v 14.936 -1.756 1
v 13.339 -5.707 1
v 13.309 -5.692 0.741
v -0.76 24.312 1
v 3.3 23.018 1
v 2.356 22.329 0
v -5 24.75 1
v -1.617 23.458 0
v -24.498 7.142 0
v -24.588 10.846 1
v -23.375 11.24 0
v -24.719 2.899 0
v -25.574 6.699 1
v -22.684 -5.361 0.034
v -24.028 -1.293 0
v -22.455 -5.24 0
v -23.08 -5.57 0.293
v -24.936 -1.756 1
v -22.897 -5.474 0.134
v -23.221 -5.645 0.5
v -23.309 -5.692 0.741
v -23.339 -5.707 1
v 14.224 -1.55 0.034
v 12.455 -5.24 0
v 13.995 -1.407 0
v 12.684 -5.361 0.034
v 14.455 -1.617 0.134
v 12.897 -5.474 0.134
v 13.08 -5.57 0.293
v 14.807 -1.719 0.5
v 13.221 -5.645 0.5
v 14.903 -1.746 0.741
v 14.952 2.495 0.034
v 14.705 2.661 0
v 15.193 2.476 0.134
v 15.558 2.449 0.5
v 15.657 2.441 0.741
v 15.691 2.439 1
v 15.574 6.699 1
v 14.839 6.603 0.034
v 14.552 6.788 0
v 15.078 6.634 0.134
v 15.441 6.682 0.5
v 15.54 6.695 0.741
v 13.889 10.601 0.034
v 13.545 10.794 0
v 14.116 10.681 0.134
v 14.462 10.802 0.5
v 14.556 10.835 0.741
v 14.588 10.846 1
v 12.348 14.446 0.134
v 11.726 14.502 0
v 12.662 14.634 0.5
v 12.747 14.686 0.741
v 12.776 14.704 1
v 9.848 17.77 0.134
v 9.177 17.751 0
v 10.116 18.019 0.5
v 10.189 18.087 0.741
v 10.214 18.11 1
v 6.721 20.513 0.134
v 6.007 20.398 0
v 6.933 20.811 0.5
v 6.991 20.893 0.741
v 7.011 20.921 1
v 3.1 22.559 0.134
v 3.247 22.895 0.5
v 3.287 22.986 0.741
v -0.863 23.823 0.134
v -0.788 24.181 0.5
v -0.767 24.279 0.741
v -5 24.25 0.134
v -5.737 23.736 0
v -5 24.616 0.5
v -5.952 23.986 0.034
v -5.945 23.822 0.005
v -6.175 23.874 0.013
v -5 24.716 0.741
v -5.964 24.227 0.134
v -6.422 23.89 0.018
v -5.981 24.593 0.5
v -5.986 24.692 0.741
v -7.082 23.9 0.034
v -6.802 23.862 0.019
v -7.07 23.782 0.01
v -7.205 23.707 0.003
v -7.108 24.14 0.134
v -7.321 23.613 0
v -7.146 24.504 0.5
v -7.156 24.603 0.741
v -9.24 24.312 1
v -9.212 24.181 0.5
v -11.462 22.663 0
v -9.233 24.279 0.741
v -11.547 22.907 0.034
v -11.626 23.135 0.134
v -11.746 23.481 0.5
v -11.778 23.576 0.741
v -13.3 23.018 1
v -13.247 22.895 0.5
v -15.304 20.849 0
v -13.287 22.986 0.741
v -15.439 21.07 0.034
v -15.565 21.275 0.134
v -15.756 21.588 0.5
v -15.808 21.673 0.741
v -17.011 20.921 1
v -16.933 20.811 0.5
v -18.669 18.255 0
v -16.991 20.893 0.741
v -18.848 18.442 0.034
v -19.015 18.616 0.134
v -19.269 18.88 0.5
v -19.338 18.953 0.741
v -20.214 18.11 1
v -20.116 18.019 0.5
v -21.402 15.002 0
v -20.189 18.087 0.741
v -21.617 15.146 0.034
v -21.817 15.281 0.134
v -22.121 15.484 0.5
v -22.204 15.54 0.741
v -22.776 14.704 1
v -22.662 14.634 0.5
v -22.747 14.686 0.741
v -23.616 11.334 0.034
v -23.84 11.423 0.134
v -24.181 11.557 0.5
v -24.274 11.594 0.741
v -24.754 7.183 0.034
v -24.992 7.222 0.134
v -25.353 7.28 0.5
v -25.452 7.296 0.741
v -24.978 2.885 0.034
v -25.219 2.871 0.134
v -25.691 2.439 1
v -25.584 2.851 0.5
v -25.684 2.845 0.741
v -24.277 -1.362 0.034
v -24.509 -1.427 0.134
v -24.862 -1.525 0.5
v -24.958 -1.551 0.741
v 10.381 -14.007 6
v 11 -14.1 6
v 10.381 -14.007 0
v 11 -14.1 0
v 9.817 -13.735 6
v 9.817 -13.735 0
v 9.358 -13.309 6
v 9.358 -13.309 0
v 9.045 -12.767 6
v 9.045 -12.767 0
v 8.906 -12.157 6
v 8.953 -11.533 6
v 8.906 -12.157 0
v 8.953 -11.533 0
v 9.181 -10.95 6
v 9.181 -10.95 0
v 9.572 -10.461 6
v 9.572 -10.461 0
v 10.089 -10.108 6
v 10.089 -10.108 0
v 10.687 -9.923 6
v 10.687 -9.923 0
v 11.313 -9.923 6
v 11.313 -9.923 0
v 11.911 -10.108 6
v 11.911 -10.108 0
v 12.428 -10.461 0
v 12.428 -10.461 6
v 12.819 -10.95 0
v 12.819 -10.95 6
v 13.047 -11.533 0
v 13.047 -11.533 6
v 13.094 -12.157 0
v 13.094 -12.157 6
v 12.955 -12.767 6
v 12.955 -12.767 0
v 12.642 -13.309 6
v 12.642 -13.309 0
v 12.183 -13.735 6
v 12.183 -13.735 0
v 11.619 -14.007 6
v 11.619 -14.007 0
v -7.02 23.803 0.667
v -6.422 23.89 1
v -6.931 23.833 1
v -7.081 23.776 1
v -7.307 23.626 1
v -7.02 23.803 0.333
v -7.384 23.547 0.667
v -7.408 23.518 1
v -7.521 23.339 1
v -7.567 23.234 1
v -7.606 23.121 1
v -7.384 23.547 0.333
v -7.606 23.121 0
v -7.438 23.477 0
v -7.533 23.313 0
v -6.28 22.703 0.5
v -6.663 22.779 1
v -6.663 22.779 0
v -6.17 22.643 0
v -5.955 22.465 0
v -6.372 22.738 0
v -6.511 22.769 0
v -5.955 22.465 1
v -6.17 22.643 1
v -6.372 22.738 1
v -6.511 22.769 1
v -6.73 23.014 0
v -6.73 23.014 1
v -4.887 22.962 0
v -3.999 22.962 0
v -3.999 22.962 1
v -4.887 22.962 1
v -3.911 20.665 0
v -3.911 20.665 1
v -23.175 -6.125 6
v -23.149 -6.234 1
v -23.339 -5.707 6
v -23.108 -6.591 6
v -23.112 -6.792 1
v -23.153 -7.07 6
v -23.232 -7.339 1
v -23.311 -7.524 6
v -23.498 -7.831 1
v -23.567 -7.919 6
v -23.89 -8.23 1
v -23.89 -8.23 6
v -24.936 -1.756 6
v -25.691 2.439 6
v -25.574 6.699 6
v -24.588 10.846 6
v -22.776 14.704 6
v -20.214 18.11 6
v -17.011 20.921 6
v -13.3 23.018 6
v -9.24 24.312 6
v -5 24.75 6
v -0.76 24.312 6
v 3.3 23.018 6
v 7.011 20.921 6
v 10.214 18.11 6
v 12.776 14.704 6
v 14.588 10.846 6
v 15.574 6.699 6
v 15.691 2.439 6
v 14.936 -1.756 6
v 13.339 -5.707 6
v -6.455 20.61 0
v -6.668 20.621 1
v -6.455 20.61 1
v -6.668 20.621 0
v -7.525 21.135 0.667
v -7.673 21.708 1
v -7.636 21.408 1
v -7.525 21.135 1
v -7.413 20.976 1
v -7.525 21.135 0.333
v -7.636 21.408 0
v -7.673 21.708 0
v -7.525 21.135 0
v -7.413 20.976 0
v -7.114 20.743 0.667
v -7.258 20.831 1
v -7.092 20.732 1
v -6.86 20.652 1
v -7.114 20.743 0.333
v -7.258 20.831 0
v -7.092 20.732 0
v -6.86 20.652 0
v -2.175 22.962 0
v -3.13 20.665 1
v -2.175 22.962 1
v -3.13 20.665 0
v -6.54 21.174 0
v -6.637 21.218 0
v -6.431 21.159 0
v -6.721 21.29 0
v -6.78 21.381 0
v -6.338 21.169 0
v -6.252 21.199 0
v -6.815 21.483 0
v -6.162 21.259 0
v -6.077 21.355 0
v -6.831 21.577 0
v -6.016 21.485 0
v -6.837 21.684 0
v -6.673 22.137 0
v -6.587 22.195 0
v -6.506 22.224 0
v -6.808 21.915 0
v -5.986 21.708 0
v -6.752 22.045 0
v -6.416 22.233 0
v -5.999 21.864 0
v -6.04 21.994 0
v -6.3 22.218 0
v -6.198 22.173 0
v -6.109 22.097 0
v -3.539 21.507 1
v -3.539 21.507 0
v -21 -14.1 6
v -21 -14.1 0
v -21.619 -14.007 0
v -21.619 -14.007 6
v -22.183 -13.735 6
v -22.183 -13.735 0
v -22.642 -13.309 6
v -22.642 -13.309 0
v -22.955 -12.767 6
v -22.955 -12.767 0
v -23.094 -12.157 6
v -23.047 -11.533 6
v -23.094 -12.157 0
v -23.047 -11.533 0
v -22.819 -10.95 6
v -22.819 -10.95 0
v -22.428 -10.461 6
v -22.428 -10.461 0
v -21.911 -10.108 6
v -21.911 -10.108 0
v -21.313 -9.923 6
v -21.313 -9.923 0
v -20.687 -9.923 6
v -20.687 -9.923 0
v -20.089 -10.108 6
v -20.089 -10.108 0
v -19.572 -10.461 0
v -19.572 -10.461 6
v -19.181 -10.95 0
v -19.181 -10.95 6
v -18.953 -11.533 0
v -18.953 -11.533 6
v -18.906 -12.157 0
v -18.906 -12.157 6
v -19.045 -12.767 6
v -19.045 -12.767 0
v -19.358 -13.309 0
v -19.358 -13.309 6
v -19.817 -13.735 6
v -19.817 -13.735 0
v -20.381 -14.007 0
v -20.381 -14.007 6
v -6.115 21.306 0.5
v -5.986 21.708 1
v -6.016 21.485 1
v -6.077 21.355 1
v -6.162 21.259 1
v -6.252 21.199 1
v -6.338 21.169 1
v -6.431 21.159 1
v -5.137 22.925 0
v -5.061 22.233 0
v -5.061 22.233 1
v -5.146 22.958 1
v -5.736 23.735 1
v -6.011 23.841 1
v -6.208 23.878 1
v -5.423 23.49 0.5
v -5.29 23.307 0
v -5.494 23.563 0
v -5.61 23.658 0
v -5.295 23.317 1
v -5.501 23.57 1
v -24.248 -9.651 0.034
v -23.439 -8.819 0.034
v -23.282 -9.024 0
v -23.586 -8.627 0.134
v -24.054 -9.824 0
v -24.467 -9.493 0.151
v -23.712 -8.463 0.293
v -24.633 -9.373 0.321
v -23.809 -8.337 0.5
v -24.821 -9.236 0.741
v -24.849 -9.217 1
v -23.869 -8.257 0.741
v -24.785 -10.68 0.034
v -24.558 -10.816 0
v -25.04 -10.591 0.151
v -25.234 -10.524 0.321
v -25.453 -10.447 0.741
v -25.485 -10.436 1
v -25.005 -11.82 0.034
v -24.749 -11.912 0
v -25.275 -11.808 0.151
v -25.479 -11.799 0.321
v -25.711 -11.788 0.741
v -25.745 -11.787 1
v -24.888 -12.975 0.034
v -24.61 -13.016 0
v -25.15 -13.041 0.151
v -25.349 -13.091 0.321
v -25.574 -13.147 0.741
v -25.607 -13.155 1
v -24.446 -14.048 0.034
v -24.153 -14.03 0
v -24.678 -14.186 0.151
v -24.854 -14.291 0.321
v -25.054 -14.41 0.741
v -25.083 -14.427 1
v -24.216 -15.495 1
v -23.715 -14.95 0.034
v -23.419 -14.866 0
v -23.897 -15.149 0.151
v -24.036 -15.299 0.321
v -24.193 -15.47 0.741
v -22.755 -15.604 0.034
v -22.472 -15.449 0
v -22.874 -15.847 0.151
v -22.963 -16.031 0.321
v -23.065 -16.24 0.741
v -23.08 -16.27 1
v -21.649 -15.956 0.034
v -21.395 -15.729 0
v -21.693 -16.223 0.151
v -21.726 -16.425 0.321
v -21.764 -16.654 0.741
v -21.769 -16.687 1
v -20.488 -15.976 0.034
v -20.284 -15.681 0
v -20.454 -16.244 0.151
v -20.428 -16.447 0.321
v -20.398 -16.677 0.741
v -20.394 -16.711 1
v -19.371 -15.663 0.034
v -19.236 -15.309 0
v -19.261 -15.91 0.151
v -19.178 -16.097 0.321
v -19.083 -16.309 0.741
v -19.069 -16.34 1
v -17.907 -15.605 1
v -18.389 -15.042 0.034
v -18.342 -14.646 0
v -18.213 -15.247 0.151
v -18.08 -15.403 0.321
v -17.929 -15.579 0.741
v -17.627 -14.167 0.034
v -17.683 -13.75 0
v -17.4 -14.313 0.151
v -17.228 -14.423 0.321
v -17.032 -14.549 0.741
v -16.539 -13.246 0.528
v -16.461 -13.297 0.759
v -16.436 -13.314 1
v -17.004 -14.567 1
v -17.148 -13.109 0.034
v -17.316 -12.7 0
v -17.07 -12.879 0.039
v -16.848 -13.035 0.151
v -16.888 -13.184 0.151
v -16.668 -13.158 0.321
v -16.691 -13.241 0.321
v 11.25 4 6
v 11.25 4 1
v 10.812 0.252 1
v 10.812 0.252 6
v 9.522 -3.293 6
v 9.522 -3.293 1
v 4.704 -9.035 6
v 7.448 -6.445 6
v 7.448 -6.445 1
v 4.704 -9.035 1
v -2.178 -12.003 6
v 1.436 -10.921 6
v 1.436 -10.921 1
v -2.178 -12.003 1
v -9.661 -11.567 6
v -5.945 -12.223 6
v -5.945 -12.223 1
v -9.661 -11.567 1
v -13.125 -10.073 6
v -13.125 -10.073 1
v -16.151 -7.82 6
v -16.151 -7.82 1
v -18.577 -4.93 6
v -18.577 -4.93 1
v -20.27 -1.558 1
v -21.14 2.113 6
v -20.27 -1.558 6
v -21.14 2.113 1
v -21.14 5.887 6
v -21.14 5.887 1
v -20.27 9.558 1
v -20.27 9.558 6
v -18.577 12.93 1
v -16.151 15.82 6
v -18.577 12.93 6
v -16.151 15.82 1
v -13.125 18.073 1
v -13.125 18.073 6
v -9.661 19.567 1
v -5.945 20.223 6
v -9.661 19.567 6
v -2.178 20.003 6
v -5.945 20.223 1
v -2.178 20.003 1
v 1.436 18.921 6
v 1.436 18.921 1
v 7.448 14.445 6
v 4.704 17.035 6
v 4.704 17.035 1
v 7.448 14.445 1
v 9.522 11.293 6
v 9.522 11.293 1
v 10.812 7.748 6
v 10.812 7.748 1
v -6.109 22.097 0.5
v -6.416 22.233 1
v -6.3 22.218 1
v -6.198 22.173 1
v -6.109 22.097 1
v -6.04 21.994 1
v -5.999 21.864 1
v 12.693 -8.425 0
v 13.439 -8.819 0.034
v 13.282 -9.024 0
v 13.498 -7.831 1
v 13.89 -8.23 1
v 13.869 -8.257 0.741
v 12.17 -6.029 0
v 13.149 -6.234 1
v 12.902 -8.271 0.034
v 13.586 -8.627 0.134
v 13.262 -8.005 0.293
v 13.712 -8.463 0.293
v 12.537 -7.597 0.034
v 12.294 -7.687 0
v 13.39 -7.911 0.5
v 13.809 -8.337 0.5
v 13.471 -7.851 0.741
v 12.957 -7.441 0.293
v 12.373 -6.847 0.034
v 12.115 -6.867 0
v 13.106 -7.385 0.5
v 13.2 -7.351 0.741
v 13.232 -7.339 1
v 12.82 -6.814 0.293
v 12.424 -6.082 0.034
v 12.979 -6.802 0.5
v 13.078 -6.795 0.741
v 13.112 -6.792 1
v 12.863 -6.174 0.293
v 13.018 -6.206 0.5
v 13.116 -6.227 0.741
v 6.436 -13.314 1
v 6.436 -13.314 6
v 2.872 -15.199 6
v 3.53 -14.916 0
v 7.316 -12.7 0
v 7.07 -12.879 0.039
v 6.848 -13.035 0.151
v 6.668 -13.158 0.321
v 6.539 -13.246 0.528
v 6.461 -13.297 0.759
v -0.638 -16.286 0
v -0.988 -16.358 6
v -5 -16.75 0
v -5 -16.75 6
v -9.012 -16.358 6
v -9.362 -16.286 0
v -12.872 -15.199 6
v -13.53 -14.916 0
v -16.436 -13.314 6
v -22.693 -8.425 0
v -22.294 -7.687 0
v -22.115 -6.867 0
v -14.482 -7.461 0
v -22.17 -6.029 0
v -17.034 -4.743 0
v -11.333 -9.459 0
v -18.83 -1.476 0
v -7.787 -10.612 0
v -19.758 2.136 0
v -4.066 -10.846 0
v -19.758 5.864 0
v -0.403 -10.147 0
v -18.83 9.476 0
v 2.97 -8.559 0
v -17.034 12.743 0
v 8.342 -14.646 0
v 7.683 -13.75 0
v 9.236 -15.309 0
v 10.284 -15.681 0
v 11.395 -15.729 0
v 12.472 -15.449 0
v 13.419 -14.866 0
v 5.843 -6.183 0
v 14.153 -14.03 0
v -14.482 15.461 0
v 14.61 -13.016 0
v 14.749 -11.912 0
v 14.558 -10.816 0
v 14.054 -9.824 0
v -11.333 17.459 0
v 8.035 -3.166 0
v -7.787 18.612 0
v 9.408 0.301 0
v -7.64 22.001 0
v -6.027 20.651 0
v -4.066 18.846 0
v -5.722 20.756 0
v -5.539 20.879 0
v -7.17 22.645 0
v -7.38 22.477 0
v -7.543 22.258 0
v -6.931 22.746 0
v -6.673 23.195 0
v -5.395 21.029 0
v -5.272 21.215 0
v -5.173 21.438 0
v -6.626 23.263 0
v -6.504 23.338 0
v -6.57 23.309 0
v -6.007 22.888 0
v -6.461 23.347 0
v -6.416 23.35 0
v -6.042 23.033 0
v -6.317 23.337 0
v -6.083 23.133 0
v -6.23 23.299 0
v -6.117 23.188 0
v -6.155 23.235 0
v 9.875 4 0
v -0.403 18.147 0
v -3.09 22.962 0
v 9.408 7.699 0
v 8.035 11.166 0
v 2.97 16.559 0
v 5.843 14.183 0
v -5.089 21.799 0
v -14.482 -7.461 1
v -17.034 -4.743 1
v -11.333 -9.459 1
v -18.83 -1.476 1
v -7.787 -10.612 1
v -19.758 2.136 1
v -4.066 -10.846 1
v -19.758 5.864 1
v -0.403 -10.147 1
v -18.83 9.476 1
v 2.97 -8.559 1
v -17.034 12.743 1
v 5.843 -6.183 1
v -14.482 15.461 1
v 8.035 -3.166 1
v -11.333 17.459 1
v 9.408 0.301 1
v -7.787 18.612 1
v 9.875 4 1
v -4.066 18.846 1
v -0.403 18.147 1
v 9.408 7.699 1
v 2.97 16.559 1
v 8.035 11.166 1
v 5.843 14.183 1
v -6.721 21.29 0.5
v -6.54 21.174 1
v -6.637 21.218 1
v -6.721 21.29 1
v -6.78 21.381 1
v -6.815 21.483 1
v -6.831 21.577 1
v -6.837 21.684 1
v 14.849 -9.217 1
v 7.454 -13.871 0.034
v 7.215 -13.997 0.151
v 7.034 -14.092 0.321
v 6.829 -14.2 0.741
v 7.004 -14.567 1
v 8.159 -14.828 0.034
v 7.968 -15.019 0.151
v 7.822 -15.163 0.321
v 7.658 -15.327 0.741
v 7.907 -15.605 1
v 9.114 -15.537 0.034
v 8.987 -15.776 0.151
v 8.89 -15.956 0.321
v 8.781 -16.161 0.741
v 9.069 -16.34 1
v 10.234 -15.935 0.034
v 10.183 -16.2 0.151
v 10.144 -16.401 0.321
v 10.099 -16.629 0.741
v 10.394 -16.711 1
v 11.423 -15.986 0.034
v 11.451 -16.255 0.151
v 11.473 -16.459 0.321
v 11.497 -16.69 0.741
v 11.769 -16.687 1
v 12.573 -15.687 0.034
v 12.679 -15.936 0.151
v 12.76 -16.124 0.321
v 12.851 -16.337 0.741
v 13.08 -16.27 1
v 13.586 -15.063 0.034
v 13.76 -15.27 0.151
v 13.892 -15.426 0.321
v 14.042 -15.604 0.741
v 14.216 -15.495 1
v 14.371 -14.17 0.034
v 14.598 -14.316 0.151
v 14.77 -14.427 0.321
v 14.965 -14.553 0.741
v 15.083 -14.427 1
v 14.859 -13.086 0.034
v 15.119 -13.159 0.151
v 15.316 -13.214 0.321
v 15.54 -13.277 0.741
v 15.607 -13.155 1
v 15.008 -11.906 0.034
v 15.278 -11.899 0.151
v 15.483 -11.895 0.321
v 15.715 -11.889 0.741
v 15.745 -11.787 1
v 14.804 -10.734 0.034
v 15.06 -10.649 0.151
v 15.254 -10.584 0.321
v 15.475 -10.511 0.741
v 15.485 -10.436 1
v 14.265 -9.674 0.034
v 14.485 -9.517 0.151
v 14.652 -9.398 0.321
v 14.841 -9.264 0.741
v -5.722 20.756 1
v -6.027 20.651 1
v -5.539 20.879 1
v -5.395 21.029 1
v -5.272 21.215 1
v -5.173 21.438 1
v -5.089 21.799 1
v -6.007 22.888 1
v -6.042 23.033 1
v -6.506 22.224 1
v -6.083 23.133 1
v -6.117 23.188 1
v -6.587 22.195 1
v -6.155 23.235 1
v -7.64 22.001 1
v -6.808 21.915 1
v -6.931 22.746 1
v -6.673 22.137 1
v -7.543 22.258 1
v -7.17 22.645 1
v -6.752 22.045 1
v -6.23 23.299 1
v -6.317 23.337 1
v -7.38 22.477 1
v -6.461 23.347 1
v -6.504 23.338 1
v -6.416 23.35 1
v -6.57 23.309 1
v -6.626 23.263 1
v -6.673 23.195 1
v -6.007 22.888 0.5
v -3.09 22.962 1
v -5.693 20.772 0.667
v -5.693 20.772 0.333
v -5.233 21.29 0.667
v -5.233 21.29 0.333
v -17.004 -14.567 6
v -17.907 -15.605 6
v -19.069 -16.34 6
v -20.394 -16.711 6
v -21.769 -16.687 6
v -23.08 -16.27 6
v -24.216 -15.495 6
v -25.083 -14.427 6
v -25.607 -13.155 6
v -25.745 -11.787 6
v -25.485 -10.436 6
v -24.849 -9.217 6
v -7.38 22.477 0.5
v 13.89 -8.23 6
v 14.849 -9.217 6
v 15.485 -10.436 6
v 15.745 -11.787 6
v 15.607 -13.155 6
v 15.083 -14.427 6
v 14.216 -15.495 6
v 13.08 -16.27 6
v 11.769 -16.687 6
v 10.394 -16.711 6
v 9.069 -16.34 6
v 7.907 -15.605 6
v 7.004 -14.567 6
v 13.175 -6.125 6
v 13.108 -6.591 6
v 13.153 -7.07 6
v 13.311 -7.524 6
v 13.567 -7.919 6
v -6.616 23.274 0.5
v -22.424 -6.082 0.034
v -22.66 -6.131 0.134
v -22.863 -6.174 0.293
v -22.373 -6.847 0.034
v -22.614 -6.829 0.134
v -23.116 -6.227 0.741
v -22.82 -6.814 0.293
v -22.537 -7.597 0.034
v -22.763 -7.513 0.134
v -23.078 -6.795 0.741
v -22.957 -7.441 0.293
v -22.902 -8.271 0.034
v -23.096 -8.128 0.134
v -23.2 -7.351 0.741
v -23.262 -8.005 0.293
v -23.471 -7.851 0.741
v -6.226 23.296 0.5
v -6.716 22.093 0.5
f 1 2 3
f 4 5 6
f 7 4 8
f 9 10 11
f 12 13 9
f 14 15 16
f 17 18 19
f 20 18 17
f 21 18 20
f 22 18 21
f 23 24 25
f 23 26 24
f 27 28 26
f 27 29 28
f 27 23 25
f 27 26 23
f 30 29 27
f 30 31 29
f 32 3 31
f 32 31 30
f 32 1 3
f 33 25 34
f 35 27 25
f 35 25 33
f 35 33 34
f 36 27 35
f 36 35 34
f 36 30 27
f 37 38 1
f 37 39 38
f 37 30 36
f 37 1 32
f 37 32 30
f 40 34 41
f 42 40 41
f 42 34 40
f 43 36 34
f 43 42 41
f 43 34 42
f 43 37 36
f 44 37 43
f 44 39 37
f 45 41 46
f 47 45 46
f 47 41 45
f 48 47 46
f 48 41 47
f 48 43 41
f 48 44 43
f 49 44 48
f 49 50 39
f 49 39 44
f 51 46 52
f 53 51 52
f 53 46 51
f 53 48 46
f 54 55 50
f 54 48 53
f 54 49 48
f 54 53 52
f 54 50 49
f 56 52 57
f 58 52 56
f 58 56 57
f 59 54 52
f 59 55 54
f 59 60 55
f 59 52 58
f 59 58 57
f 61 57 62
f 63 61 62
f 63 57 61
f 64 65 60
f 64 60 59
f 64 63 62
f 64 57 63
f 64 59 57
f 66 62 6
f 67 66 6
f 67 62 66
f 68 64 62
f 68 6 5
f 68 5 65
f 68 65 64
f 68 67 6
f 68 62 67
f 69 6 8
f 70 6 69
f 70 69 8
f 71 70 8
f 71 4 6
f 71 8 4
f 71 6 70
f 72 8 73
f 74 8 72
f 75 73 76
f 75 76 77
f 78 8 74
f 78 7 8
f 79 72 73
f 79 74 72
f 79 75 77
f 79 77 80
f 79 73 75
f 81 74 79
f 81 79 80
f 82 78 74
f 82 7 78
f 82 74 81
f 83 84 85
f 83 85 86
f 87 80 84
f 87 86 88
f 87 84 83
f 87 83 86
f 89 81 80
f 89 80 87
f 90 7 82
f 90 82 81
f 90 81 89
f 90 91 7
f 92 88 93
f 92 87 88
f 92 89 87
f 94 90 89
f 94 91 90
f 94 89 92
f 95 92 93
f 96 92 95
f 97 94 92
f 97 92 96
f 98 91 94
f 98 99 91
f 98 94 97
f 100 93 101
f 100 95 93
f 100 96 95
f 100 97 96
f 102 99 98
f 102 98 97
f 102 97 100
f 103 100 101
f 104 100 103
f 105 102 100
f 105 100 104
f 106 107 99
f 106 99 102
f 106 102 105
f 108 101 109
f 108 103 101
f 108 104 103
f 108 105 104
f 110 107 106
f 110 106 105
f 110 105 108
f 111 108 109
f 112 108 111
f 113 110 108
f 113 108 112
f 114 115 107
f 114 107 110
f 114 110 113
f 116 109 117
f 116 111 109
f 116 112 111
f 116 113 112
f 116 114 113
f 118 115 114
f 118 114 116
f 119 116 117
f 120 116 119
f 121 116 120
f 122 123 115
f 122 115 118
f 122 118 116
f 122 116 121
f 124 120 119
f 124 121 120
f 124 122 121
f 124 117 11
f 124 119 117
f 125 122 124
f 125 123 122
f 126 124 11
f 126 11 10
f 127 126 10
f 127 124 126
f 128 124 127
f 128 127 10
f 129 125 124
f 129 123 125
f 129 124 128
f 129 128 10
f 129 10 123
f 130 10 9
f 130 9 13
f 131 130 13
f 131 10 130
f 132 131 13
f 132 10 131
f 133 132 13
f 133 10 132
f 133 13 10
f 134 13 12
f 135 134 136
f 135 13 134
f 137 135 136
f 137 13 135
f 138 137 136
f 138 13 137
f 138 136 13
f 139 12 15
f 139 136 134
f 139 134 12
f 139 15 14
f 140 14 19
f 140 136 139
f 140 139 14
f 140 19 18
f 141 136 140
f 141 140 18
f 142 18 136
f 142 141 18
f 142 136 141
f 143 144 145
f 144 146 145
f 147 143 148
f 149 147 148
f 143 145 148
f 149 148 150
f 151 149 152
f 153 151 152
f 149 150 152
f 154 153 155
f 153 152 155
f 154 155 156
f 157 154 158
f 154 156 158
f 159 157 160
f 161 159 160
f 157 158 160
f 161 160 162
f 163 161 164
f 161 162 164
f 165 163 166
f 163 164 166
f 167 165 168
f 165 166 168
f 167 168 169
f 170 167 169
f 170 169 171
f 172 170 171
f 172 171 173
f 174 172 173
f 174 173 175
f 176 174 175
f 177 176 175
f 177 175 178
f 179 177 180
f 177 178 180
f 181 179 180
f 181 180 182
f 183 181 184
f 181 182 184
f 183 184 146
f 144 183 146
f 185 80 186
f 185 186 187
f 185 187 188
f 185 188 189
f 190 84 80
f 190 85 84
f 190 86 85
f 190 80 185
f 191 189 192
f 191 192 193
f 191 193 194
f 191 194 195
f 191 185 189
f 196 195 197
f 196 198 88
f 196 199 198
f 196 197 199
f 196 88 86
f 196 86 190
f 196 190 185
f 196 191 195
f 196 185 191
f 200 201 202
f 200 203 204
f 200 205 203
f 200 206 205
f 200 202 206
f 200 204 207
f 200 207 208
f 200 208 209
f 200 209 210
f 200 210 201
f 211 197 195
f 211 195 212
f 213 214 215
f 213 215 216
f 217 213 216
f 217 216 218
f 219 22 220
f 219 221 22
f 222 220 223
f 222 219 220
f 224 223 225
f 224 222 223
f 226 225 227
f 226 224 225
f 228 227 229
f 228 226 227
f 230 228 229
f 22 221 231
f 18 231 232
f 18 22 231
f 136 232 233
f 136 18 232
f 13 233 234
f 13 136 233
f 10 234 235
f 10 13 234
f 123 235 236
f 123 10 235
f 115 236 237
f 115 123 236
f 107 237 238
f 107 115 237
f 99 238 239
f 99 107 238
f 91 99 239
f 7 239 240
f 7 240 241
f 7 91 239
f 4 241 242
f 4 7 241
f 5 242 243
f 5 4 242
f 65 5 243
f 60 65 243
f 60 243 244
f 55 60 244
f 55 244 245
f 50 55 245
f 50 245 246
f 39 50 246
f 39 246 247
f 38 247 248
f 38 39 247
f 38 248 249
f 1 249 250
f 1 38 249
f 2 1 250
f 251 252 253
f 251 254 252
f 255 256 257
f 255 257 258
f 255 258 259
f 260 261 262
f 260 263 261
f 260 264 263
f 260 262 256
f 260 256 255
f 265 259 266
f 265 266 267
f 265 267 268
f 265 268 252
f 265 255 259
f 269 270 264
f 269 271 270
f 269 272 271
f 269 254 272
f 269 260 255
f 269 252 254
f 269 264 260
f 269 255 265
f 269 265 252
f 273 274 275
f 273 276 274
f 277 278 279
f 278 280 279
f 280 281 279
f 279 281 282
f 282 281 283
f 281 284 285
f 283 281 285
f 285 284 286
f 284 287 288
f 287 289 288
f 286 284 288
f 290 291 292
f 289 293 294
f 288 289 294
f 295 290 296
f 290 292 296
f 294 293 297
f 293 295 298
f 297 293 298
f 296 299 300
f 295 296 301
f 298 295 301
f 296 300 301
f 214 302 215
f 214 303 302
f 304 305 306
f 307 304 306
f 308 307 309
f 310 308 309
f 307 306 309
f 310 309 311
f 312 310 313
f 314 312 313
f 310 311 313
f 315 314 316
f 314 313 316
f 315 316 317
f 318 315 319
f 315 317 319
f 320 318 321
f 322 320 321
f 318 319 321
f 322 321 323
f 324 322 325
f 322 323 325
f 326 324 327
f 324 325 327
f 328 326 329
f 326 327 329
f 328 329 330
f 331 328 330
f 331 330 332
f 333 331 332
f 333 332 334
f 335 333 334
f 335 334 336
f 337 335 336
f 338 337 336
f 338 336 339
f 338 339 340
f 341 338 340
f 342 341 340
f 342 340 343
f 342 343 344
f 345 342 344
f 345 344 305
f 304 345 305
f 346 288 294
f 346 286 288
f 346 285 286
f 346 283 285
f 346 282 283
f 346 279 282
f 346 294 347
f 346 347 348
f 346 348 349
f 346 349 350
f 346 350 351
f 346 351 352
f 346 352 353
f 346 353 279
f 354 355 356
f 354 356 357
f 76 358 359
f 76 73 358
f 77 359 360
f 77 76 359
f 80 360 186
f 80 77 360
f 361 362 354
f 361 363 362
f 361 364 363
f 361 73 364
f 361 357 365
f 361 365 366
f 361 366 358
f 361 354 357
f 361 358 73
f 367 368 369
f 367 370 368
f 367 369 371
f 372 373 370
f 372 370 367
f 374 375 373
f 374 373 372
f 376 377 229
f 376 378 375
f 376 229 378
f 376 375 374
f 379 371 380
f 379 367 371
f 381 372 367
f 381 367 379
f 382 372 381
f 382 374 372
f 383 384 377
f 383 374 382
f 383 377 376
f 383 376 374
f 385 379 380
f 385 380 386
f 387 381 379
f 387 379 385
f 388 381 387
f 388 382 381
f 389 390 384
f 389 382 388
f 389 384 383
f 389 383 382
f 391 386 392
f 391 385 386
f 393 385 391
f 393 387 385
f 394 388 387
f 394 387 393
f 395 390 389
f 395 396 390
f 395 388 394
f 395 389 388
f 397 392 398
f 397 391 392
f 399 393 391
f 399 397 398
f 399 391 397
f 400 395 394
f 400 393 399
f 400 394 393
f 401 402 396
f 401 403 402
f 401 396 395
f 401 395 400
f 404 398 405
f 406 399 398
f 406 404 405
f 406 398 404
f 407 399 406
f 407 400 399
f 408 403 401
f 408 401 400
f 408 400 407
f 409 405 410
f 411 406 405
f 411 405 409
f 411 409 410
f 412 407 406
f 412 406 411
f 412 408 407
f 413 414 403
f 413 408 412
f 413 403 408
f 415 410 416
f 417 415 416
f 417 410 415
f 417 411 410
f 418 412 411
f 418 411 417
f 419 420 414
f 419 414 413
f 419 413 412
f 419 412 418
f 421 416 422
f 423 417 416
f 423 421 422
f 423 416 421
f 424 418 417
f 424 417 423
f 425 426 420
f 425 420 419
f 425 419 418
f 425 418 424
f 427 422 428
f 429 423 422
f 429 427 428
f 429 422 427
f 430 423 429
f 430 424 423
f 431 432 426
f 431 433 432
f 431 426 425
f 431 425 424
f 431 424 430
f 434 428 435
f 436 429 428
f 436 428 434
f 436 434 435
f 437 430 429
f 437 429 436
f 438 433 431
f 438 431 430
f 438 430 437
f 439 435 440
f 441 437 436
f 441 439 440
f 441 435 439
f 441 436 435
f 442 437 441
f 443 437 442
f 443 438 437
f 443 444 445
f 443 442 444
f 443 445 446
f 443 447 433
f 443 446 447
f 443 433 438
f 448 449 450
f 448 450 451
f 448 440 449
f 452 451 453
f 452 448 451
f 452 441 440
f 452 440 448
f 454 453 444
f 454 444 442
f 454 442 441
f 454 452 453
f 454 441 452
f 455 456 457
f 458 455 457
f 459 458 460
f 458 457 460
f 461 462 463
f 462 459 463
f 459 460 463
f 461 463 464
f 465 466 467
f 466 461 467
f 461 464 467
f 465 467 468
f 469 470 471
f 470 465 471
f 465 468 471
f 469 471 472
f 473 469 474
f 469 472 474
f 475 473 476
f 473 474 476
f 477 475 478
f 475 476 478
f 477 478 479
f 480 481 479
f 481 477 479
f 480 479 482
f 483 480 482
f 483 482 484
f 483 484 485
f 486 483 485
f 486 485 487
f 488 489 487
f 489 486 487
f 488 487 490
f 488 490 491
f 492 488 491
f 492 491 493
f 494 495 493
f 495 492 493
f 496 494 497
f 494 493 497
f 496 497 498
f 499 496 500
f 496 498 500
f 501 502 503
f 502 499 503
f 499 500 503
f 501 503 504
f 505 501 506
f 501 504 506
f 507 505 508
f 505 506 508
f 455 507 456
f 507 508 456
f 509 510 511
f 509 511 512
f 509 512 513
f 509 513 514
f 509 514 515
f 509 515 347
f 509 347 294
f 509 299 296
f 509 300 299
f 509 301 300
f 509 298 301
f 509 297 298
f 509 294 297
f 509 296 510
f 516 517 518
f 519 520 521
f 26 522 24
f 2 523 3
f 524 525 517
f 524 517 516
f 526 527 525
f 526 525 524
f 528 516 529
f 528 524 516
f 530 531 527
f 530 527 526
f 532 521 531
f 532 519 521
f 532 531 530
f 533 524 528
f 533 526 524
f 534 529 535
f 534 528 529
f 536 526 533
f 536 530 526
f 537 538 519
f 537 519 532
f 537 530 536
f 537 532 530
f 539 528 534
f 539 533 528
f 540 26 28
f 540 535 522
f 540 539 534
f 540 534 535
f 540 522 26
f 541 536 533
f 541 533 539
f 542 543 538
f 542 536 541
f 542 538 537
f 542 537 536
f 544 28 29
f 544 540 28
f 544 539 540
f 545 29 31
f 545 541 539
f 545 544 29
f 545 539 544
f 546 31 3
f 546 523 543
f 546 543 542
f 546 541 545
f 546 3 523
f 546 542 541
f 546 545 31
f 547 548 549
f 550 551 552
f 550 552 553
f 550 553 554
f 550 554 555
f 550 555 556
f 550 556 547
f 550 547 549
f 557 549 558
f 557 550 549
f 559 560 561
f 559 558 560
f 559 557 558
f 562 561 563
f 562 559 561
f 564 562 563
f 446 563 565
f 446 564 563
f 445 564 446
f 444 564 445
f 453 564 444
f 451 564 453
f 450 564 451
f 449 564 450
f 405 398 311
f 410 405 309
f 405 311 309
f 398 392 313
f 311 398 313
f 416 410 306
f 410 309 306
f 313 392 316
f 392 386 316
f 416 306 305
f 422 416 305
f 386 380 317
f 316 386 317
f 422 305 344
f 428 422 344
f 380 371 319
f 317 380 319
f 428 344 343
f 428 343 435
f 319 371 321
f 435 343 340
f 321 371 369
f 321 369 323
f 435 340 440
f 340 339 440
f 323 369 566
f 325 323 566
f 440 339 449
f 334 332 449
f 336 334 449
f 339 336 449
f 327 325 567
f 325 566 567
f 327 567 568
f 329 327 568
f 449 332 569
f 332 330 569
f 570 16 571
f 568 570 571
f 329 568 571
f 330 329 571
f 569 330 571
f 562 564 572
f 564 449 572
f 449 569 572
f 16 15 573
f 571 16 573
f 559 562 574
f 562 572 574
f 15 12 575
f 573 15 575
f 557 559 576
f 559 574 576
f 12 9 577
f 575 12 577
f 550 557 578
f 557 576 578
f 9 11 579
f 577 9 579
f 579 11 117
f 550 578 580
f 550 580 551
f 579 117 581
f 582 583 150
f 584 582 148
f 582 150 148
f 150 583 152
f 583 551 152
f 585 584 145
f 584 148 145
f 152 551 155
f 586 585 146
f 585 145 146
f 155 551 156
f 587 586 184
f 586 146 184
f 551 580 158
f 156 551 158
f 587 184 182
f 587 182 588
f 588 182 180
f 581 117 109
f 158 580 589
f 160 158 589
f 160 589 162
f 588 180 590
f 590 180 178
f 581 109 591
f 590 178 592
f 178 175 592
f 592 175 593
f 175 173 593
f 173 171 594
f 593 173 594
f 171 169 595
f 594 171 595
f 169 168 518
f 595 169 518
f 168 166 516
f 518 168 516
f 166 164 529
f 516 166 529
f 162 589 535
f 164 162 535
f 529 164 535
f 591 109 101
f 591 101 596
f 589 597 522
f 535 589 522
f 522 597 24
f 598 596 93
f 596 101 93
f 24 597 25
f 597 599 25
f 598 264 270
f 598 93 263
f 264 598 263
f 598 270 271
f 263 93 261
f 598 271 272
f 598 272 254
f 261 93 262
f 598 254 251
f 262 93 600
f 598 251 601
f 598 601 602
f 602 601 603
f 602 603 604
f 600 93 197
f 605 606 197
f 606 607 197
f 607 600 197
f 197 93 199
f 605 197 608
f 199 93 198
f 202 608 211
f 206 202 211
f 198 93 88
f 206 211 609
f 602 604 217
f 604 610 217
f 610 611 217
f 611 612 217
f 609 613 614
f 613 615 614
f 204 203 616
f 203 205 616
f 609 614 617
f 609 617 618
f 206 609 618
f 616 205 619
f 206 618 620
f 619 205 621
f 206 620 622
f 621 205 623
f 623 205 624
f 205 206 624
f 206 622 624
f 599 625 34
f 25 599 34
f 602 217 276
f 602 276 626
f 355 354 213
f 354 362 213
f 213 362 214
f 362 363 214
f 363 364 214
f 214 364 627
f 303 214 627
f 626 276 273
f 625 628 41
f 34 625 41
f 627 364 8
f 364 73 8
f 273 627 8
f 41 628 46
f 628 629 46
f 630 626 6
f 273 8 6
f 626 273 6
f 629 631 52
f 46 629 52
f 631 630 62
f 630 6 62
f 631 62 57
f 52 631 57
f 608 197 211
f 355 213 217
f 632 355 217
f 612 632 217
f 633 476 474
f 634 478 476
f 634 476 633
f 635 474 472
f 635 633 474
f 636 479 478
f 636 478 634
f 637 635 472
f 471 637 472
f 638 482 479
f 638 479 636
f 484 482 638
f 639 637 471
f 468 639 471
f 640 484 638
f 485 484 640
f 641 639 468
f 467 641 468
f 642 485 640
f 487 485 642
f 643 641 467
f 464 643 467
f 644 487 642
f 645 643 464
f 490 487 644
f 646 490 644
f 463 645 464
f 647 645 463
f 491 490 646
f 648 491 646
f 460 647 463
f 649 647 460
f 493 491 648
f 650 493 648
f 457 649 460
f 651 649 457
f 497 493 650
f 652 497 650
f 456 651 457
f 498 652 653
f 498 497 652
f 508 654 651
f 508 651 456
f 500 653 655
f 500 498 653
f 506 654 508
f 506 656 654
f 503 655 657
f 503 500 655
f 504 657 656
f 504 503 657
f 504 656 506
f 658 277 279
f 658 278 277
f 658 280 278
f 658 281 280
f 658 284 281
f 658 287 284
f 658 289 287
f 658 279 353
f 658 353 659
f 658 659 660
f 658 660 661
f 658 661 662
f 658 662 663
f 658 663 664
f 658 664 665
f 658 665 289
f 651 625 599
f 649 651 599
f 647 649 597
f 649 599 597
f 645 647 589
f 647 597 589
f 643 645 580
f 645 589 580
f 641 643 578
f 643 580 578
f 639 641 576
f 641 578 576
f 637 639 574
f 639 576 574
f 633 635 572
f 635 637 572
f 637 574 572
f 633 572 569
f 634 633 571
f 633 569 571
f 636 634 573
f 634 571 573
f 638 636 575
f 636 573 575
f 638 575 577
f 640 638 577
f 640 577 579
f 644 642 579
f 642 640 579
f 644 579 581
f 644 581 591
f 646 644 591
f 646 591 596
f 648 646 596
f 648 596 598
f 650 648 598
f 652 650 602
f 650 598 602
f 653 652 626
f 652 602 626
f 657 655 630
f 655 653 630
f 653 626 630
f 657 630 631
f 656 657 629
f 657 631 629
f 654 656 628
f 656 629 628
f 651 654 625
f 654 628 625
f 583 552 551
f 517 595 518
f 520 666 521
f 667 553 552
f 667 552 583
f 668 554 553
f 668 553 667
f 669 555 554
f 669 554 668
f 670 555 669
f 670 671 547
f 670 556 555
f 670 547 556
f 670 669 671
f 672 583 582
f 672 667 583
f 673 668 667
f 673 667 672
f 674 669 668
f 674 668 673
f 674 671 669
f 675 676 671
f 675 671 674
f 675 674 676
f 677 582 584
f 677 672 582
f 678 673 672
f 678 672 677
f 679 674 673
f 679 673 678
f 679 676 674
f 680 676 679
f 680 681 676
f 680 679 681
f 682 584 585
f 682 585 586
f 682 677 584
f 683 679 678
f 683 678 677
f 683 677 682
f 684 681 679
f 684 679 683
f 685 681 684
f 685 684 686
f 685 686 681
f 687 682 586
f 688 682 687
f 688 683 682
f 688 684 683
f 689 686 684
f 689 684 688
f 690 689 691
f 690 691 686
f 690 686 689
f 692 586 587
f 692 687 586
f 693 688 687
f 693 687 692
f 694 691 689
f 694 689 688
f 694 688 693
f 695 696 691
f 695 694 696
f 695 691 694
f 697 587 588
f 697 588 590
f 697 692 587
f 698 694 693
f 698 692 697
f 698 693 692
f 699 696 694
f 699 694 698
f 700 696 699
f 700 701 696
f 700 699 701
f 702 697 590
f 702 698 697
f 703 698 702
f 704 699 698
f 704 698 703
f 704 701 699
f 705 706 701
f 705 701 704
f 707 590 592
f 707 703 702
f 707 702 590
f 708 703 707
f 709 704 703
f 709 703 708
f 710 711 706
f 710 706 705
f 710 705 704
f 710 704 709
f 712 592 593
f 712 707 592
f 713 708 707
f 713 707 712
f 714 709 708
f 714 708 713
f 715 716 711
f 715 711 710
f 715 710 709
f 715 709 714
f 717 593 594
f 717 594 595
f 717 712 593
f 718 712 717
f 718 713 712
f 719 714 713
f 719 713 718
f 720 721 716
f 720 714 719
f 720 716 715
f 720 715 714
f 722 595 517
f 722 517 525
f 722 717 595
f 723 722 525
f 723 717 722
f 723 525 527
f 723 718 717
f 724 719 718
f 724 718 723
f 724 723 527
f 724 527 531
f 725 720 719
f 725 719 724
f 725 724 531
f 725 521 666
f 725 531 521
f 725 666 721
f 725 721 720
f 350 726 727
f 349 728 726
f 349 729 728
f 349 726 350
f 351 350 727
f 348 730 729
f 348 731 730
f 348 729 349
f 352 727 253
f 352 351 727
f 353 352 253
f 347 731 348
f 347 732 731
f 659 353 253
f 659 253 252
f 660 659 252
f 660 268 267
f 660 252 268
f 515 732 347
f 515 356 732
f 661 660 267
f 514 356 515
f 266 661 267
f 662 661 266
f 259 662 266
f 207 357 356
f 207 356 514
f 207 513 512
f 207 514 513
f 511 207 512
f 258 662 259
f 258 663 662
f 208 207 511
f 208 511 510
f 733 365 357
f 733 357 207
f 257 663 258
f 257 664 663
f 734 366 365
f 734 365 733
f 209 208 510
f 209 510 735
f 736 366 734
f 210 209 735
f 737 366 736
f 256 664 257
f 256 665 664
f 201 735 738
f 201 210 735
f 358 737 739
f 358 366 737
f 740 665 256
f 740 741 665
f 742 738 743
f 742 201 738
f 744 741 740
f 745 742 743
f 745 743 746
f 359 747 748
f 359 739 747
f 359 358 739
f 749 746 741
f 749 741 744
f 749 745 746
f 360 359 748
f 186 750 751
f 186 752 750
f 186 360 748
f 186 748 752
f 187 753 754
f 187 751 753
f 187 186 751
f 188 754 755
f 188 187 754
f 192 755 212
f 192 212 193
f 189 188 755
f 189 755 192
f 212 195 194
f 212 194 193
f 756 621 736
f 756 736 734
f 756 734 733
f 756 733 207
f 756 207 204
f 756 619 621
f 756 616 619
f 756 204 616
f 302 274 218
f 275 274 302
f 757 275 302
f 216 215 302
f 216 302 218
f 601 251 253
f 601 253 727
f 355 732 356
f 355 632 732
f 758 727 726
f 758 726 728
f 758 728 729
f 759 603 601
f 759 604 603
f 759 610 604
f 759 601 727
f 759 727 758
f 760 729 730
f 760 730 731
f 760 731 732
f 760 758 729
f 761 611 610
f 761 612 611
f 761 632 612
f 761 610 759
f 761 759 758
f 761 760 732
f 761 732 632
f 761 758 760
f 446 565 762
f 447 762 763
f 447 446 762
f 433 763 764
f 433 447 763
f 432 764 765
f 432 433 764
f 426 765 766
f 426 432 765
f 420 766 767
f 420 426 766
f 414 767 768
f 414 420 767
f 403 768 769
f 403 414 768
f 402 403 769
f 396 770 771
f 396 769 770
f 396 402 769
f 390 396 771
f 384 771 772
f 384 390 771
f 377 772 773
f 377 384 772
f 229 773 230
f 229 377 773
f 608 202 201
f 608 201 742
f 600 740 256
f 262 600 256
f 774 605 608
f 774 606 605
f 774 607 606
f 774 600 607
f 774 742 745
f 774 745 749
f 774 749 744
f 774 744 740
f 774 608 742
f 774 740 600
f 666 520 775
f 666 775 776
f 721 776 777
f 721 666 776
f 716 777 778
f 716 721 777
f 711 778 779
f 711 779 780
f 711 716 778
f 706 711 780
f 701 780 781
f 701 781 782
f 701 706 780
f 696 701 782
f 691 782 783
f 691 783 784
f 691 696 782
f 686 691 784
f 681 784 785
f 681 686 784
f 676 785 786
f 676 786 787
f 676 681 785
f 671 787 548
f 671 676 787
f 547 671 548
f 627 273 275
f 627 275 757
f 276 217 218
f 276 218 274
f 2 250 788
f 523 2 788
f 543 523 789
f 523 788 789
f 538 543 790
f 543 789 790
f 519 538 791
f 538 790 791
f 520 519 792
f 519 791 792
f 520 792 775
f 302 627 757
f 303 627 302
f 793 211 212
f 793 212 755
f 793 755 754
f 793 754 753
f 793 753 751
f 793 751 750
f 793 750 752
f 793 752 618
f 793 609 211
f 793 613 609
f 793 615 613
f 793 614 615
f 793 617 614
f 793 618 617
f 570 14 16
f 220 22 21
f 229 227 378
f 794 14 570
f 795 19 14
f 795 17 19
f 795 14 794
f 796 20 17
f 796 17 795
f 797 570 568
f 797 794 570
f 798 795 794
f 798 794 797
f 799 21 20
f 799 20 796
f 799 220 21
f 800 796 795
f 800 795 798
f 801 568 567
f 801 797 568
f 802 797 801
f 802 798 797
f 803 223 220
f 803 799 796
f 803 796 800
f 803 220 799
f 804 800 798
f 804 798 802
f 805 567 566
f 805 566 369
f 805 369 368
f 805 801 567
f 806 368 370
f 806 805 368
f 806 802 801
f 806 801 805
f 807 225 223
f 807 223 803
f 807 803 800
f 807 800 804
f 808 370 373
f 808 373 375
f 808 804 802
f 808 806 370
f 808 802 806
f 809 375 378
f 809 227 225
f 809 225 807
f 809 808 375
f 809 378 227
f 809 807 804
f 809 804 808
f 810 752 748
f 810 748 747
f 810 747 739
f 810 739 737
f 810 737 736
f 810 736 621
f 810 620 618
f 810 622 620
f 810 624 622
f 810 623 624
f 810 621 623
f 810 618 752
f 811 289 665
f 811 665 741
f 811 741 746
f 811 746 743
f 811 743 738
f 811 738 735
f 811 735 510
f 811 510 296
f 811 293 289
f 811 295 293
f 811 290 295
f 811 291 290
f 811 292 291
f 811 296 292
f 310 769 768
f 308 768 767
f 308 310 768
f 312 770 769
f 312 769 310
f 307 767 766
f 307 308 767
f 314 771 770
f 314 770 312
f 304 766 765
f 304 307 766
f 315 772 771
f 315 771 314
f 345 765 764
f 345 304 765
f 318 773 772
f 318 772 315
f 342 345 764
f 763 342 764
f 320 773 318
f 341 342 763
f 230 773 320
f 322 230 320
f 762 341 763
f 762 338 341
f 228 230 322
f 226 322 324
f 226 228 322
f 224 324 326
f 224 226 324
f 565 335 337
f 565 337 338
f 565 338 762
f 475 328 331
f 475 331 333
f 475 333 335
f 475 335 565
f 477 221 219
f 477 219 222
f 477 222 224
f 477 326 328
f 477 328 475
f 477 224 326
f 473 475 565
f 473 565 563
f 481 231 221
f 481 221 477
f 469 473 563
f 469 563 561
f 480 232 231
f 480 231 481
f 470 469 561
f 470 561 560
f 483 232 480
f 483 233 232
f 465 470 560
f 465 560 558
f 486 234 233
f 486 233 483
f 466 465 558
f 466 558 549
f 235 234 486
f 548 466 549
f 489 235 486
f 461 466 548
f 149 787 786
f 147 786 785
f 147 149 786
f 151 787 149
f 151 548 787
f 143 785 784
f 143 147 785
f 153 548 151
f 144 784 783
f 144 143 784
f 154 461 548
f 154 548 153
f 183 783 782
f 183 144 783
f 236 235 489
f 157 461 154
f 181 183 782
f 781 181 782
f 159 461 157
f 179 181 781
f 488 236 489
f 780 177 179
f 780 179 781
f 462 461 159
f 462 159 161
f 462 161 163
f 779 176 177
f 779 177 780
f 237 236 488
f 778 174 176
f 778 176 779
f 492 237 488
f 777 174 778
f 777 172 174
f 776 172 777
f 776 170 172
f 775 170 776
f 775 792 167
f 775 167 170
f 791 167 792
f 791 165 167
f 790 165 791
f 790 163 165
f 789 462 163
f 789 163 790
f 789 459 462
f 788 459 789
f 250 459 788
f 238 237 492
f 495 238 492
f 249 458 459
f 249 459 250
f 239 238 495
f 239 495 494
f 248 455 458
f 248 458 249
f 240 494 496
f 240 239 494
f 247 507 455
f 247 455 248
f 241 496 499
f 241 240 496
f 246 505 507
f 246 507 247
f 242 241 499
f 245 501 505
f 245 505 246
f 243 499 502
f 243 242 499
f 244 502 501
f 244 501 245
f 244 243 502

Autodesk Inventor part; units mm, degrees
ref_plane "YZ Plane" through (0, 0, 0) normal (1, 0, 0) x (0, 1, 0)
ref_plane "XZ Plane" through (0, 0, 0) normal (0, 1, 0) x (-1, 0, 0)
sketch "Sketch1: base" plane through (0, 0, 0) normal (0, 0, 1) x (1, 0, 0)
  circle A0 centre (-5, 4) radius 16.25
  circle A1 centre (-5, 4) radius 20.75
  circle A2 centre (-21, -12) radius 4.75
  circle A3 centre (11, -12) radius 4.75
  line L0 (-21, -12) -> (11, -12) construction
  line L1 (-21, 20) -> (-21, -12) construction
  point P0 (0, 0)
  point P1 (-5, -12)
  point P2 (-21, 4)
  point P3 (-22.3145, -7.4355)
  point P4 (-16.4355, -13.3145)
  point P5 (6.4355, -13.3145)
  point P6 (12.3145, -7.4355)
  dimension "d0" = 9.5
  dimension "d1" = 32
  dimension "d2" = 41.5
  dimension "d3" = 32.5
  dimension "d4" = 32
sketch "Sketch2: tube stopper" plane through (0, 0, 0) normal (0, 0, 1) x (1, 0, 0)
  circle A0 centre (-5, 4) radius 14.875
  circle A1 centre (-5, 4) radius 16.25 projected
  point P0 (0, 0)
  dimension "d14" = 29.75
extrude "Ex1: base" add sketch "Sketch1: base" along normal blind 6
ref_plane "Work Plane1" through (0, 0, 0) normal (0, 0, 1) x (1, 0, 0)
sketch "Sketch: text" plane through (0, 0, 0) normal (0, 0, -1) x (-1, 0, 0)
  line L0 (3.25, 24) -> (6.75, 24) construction
  line L1 (6.75, 24) -> (6.75, 20.5) construction
  line L2 (6.75, 20.5) -> (3.25, 20.5) construction
  line L3 (3.25, 20.5) -> (3.25, 24) construction
  line L4 (2.1748, 22.9624) -> (3.0901, 22.9624)
  line L5 (3.0901, 22.9624) -> (3.5386, 21.5071)
  line L6 (3.5386, 21.5071) -> (3.9993, 22.9624)
  line L7 (3.9993, 22.9624) -> (4.8871, 22.9624)
  line L8 (4.8871, 22.9624) -> (3.9108, 20.665)
  line L9 (3.9108, 20.665) -> (3.1297, 20.665)
  line L10 (3.1297, 20.665) -> (2.1748, 22.9624)
  line L11 (7.6056, 23.1211) -> (6.7299, 23.0143)
  spline S0 degree 2 poles (6.7299, 23.0143) (6.6964, 23.1973) (6.5347, 23.3499) (6.4157, 23.3499) knots 0 0 0 1 2 2 2
  spline S1 degree 2 poles (6.4157, 23.3499) (6.2021, 23.3499) (6.0831, 23.1333) knots 0 0 0 1 1 1
  spline S2 degree 2 poles (6.0831, 23.1333) (5.9946, 22.9777) (5.955, 22.4651) knots 0 0 0 1 1 1
  spline S3 degree 2 poles (5.955, 22.4651) (6.1136, 22.6268) (6.4462, 22.7794) (6.6628, 22.7794) knots 0 0 0 1 2 2 2
  spline S4 degree 2 poles (6.6628, 22.7794) (7.0869, 22.7794) (7.6727, 22.1753) (7.6727, 21.7084) knots 0 0 0 1 2 2 2
  spline S5 degree 2 poles (7.6727, 21.7084) (7.6727, 21.3942) (7.3767, 20.8755) (6.852, 20.6101) (6.4553, 20.6101) knots 0 0 0 1 2 3 3 3
  spline S6 degree 2 poles (6.4553, 20.6101) (5.9794, 20.6101) (5.4058, 20.9335) (5.061, 21.6474) (5.061, 22.2332) knots 0 0 0 1 2 3 3 3
  spline S7 degree 2 poles (5.061, 22.2332) (5.061, 23.0906) (5.7841, 23.8899) (6.4218, 23.8899) knots 0 0 0 1 2 2 2
  spline S8 degree 2 poles (6.4218, 23.8899) (6.8001, 23.8899) (7.2394, 23.716) (7.5293, 23.3773) (7.6056, 23.1211) knots 0 0 0 1 2 3 3 3
  spline S9 degree 2 poles (5.9855, 21.7084) (5.9855, 21.4522) (6.2448, 21.1593) (6.4309, 21.1593) knots 0 0 0 1 2 2 2
  spline S10 degree 2 poles (6.4309, 21.1593) (6.6048, 21.1593) (6.8367, 21.4217) (6.8367, 21.684) knots 0 0 0 1 2 2 2
  spline S11 degree 2 poles (6.8367, 21.684) (6.8367, 21.9525) (6.5957, 22.2332) (6.4157, 22.2332) knots 0 0 0 1 2 2 2
  spline S12 degree 2 poles (6.4157, 22.2332) (6.2326, 22.2332) (5.9855, 21.9617) (5.9855, 21.7084) knots 0 0 0 1 2 2 2
  point P0 (0, 0)
  point P1 (5, 4)
  point P2 (5, 20.5)
  dimension "d22" = 3.5
  dimension "d23" = 16.5
hole "Hole1: M3 heat-sets" at (11, -12, 0) at (-21, -12, 0) direction (0, 0, -1) diameter 4.2 end through all both
extrude "Ex: tube stopper" add sketch "Sketch2: tube stopper" along normal blind 1
fillet "Fillet1" radius 2 2 edges at (12.3145, -7.4355, 3) (-22.3145, -7.4355, 3)
fillet "Fillet2" radius 1 5 edges at (-23.1529, -7.0697, 0) (-23.6764, -15.9242, 0) (13.1529, -7.0697, 0) (13.6764, -15.9242, 0) (-5, 24.75, 0)
extrude "Ex: text" cut sketch "Sketch: text" against normal blind 1
properties part number "cage_inside_06"
